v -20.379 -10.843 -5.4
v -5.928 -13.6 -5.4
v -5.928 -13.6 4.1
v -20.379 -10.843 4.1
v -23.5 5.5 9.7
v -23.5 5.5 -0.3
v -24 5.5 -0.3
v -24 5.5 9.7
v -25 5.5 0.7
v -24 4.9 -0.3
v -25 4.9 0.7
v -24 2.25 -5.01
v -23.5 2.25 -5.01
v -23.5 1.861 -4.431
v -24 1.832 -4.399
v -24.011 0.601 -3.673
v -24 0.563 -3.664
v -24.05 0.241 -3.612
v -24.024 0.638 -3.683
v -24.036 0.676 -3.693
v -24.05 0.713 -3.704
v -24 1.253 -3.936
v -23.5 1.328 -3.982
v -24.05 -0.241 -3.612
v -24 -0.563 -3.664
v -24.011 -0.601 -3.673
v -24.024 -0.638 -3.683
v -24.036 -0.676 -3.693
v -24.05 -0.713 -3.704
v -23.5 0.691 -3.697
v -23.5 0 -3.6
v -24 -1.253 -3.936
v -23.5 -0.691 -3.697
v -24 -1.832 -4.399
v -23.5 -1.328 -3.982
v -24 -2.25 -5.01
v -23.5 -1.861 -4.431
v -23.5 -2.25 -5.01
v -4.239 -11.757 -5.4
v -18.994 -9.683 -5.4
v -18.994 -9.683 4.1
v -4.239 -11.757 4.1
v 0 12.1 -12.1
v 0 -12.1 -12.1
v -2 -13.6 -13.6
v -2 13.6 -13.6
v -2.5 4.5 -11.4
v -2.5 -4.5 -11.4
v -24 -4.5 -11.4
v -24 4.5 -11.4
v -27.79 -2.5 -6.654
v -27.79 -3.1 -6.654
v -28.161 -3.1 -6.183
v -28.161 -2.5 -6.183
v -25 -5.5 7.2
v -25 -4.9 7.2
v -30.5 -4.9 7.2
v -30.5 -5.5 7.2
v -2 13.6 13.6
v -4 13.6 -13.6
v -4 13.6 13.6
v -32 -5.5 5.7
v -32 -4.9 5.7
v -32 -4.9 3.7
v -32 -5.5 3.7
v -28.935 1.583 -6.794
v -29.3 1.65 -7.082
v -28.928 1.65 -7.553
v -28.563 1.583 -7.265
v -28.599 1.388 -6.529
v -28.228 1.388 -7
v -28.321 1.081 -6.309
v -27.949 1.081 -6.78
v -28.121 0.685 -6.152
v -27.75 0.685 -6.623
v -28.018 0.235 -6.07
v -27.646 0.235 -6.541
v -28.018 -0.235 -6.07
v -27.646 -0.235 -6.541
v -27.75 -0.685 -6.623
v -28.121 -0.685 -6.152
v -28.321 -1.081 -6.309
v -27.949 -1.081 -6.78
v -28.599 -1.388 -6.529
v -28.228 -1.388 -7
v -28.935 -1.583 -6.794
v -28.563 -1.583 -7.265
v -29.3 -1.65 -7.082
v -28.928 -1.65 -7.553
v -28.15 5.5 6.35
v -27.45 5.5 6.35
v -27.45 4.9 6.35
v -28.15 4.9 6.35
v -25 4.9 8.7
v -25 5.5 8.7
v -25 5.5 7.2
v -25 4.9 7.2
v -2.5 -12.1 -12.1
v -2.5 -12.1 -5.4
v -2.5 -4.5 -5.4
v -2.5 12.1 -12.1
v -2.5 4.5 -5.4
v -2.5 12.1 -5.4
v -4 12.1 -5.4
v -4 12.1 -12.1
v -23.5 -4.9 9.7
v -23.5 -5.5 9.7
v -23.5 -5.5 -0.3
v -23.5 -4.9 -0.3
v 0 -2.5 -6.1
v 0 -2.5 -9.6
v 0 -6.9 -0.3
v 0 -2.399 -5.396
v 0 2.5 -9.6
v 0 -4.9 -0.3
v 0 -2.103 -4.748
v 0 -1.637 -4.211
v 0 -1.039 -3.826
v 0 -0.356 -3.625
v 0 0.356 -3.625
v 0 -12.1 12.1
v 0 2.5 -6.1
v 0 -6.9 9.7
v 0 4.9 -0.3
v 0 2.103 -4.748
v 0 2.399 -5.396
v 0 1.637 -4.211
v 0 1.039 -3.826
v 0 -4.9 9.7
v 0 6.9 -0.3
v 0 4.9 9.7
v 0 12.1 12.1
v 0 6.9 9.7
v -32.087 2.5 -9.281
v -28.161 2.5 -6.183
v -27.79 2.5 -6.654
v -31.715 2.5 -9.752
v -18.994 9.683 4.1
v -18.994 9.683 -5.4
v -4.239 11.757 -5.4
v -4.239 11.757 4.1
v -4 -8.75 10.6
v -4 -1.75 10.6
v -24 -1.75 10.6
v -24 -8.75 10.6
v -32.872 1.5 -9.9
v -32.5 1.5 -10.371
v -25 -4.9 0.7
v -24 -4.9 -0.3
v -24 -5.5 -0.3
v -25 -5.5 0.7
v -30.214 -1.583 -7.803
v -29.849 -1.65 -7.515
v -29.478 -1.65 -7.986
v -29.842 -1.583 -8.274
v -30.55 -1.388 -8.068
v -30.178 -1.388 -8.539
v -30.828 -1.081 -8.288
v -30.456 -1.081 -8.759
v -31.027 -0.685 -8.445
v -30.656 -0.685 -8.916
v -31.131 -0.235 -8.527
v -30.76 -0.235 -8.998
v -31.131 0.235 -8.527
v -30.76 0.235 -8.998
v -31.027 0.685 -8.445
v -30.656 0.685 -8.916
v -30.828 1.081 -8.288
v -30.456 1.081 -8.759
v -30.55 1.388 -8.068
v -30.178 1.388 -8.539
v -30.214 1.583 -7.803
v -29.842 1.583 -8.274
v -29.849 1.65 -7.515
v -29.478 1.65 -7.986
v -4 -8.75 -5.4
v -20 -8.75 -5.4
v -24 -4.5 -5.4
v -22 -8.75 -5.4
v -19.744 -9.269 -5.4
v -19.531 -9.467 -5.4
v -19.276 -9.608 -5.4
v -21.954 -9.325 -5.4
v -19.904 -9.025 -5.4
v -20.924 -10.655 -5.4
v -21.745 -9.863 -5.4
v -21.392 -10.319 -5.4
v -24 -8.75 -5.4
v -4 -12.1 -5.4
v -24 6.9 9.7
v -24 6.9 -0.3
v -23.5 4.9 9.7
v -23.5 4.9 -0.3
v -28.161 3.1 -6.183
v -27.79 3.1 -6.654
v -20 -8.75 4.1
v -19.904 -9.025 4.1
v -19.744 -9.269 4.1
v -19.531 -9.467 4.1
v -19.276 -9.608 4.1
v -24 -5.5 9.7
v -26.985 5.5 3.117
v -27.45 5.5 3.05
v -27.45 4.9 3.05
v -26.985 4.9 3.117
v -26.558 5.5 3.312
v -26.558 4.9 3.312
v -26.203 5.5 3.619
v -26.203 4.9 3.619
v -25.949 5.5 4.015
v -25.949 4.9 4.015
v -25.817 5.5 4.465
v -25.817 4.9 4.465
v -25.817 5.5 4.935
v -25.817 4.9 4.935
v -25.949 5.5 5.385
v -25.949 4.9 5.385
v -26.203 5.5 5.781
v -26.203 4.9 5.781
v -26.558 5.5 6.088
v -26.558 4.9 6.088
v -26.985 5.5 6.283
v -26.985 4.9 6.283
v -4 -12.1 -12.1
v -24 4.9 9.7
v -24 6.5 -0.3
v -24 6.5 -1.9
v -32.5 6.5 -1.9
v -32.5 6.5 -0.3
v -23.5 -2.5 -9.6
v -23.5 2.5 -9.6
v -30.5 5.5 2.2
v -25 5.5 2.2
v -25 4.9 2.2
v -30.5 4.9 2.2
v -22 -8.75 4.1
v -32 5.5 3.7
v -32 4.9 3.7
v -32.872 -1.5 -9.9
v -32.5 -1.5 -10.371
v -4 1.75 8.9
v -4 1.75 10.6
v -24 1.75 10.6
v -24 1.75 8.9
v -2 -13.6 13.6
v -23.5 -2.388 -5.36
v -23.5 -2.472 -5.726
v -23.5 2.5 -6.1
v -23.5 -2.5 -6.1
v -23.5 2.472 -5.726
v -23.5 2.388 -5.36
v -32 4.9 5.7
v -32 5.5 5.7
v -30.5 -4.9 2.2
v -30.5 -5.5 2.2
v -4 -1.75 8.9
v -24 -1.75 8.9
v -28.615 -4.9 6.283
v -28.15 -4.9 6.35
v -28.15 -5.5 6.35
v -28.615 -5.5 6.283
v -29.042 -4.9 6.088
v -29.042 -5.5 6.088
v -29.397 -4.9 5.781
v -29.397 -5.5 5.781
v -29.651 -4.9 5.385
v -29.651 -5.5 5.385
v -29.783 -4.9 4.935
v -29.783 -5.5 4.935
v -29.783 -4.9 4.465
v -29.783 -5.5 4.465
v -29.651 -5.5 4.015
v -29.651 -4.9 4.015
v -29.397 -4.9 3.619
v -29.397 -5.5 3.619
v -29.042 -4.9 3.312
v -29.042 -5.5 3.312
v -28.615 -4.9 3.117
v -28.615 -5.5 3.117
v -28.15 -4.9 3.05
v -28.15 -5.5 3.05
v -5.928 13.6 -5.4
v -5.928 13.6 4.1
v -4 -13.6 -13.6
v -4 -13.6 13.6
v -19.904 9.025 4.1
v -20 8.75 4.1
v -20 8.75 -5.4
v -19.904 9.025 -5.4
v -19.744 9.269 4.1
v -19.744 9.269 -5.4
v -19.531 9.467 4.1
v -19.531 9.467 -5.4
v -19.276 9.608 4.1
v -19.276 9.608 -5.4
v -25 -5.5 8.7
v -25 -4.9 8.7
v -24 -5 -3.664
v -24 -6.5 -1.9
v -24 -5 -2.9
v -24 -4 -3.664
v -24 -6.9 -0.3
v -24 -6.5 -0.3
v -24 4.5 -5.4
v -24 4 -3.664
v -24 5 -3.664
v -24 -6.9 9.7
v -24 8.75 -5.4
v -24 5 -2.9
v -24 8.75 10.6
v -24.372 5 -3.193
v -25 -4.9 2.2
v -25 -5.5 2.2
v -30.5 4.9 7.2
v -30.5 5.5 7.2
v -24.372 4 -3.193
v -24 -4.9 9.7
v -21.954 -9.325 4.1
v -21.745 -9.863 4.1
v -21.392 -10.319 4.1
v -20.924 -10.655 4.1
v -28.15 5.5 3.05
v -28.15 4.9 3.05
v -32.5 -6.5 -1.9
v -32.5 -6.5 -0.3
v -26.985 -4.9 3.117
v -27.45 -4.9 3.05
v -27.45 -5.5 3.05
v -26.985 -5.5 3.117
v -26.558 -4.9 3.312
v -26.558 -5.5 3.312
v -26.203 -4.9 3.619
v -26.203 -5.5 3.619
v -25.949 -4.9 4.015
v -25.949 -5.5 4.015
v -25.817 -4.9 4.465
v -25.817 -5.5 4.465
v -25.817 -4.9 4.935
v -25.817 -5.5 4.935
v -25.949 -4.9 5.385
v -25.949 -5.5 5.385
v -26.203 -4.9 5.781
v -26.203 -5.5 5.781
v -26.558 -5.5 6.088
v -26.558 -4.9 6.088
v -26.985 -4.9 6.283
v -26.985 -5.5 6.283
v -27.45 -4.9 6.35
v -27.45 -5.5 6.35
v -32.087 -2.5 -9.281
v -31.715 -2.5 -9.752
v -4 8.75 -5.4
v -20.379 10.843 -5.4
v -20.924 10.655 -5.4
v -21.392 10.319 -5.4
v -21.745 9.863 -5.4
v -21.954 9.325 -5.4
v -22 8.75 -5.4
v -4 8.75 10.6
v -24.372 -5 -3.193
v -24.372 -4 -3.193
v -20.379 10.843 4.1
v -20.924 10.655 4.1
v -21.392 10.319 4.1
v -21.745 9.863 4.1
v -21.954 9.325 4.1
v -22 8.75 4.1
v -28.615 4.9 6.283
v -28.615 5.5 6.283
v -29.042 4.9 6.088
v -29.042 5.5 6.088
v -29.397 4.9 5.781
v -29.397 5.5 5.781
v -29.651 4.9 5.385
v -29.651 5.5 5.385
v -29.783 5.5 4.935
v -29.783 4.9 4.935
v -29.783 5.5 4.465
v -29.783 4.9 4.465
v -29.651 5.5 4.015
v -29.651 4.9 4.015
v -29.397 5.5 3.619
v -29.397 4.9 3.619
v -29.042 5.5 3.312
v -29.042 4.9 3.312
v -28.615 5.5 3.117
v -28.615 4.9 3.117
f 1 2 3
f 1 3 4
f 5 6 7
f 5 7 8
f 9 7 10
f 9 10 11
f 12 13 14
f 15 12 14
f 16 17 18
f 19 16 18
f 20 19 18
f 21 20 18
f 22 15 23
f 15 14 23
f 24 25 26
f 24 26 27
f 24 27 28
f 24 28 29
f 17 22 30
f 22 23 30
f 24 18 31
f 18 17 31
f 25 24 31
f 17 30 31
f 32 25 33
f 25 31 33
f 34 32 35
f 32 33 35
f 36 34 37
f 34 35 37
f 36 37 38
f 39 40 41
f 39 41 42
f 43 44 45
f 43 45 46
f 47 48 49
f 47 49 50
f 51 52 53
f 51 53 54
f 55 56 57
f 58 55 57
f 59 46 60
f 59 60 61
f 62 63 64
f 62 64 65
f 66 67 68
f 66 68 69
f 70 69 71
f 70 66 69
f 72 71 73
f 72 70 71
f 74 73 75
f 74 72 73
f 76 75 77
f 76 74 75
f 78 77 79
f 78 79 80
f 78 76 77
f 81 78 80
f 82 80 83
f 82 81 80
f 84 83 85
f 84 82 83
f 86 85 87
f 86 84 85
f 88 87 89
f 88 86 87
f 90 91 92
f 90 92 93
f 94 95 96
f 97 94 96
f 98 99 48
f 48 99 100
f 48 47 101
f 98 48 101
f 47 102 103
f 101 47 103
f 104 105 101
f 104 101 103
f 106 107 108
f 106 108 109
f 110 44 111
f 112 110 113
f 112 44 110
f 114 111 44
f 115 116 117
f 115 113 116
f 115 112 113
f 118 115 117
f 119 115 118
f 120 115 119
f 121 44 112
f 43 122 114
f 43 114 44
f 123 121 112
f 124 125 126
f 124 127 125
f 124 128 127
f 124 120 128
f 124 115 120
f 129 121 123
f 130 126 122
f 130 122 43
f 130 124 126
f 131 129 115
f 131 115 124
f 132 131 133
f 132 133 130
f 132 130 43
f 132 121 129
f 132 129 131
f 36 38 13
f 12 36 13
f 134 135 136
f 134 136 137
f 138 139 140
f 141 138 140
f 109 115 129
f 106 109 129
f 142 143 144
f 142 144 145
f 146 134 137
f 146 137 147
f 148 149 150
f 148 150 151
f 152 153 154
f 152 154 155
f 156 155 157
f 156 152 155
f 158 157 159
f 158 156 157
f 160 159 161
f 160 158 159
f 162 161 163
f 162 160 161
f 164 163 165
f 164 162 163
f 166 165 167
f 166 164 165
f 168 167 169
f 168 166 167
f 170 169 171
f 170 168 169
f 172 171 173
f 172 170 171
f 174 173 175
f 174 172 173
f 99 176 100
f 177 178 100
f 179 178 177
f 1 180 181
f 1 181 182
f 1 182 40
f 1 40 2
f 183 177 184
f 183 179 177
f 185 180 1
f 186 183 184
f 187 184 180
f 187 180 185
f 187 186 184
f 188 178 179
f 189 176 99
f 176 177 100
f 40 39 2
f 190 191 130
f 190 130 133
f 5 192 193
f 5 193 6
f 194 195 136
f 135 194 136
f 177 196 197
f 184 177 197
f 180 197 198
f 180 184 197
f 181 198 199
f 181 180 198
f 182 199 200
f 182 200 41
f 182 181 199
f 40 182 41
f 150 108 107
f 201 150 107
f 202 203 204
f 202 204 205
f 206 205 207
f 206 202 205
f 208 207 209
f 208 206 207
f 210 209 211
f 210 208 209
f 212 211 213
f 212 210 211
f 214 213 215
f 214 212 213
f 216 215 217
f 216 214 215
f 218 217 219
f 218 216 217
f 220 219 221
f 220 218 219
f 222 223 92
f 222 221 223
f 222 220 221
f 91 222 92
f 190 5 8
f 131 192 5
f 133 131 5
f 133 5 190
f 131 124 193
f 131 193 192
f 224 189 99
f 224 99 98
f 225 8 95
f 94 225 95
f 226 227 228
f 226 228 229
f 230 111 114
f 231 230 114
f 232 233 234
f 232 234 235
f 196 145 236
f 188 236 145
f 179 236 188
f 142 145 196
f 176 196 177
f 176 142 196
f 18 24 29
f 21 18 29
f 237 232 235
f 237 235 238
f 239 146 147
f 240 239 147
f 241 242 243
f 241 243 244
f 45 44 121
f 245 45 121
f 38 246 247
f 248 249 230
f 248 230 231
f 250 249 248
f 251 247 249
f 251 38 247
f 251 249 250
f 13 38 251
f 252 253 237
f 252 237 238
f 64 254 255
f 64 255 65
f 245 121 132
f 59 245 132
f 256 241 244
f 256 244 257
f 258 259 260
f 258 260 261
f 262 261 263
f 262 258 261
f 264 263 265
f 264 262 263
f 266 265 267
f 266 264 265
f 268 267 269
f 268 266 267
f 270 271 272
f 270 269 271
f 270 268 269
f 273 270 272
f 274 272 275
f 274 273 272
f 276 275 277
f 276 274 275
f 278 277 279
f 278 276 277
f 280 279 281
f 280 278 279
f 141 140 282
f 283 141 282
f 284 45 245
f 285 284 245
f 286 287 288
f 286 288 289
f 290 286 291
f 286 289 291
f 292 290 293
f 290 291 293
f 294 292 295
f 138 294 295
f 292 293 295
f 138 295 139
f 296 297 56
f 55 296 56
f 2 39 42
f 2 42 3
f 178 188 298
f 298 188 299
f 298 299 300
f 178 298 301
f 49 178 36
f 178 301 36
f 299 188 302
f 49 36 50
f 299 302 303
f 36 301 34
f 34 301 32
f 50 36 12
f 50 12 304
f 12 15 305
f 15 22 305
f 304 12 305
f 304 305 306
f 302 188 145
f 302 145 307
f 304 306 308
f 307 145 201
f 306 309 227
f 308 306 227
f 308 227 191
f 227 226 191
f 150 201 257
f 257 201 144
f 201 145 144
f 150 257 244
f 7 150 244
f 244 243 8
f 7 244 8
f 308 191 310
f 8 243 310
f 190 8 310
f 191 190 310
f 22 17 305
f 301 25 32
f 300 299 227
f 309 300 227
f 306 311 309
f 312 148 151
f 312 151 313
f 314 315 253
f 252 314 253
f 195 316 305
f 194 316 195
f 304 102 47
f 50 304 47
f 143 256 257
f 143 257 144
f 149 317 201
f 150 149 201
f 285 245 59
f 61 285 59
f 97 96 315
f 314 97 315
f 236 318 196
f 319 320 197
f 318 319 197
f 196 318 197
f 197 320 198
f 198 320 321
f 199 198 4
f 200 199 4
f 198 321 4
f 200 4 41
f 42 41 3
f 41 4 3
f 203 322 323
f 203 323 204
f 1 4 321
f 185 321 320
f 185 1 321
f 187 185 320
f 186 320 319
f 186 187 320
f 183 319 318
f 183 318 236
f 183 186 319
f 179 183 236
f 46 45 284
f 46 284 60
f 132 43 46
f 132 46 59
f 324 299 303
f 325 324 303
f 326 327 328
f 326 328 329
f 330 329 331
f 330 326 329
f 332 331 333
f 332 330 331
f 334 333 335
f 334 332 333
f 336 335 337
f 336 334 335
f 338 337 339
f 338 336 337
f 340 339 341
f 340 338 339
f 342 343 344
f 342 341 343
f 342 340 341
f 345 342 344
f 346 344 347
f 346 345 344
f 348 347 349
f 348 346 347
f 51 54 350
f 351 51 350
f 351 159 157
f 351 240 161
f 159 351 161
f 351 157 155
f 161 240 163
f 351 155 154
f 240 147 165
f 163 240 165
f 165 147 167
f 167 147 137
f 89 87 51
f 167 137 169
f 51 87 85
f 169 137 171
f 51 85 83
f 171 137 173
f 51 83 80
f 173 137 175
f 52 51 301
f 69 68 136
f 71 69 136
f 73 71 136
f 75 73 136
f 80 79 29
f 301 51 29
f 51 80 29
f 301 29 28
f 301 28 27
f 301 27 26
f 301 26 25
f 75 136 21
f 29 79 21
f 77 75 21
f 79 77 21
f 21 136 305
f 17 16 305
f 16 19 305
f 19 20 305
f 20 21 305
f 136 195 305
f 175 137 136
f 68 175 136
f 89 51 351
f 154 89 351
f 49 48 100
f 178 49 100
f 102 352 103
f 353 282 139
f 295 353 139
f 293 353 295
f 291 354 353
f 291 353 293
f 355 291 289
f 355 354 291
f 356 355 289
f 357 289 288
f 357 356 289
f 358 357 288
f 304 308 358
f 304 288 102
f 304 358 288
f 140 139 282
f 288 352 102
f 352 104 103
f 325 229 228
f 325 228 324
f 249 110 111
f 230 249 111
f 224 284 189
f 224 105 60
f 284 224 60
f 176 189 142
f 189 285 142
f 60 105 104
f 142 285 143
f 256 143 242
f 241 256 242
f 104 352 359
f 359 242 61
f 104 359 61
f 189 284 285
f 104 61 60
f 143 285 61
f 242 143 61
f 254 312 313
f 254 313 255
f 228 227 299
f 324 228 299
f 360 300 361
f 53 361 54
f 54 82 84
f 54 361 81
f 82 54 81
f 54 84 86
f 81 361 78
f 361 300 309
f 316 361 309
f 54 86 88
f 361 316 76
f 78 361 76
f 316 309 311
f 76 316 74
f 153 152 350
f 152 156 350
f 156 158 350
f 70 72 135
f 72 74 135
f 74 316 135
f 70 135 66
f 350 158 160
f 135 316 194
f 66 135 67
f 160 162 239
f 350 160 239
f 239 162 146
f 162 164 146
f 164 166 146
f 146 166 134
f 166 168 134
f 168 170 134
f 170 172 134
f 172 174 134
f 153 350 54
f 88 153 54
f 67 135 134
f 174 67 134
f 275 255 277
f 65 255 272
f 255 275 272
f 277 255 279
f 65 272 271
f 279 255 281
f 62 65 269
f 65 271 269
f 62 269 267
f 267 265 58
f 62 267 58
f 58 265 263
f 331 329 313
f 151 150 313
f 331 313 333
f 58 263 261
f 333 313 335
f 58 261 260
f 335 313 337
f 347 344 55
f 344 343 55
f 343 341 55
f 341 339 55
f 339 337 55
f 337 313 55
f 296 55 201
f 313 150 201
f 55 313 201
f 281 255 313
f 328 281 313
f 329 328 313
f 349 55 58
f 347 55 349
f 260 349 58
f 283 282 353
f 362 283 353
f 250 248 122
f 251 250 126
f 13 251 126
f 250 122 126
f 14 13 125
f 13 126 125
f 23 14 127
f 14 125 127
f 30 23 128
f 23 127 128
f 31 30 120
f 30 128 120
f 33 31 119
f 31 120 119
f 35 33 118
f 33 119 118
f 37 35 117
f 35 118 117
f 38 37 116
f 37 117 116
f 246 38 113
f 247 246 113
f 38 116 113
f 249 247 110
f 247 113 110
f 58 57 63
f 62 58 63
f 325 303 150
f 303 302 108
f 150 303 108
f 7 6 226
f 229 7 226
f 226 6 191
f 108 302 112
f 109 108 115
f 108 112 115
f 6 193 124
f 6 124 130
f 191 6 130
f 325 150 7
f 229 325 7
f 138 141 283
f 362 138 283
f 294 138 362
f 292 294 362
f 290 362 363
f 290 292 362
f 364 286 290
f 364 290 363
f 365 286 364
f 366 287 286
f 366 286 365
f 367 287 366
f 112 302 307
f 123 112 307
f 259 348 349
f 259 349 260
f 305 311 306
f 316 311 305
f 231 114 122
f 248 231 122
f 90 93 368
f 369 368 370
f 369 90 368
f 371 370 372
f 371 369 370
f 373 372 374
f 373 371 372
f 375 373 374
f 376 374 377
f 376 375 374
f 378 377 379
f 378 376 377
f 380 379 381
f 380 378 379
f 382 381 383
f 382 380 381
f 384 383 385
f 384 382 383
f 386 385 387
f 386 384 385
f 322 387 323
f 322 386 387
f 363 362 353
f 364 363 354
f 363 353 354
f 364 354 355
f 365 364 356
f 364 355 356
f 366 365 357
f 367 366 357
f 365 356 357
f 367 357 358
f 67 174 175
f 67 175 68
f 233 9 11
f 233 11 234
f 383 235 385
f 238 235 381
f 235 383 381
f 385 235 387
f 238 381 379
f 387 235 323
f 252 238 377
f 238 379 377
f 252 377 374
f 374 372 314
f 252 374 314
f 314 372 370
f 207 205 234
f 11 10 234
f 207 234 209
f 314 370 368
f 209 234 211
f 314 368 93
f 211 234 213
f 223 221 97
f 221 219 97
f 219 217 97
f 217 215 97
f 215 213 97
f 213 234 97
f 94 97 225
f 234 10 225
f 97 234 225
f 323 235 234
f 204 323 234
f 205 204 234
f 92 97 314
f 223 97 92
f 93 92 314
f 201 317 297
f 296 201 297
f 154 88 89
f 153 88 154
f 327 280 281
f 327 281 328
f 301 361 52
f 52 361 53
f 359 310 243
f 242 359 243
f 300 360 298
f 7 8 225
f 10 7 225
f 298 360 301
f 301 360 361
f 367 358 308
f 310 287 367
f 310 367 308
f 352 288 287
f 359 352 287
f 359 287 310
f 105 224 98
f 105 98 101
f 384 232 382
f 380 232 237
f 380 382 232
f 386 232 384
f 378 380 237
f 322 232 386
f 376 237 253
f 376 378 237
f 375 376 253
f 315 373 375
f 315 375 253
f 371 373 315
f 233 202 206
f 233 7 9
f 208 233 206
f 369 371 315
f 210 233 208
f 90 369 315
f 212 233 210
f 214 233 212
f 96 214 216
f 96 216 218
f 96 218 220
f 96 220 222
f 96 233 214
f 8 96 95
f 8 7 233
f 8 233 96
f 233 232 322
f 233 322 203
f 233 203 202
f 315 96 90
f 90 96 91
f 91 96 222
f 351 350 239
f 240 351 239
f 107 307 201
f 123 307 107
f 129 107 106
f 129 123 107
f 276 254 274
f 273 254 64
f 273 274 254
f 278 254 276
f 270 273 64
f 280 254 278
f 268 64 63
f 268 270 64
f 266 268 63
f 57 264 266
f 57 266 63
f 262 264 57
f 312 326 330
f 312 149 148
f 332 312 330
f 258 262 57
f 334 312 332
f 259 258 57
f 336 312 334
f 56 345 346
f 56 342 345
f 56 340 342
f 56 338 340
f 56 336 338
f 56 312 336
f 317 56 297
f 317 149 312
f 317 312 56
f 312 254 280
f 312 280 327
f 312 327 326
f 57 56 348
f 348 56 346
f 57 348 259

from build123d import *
from OCP.BRepFilletAPI import BRepFilletAPI_MakeChamfer

# Parameters (mm, degrees)
CROQUIS1_W                = 27.2
CROQUIS1_H                = 27.2
SALIENTE_EXTRUIR1_DEPTH   = 4
CHAFL_N1_SIZE             = 2
CHAFL_N1_SIZE2            = 1.5
SALIENTE_EXTRUIR2_DEPTH   = 20
CORTAR_EXTRUIR1_DEPTH     = 1.5
SALIENTE_EXTRUIR3_DEPTH   = 9.5
CROQUIS6_W                = 13
CROQUIS6_H                = 1.6
SALIENTE_EXTRUIR4_DEPTH   = 8.5
CROQUIS7_W                = 0.6
CROQUIS7_H                = 10
SALIENTE_EXTRUIR5_DEPTH   = 8
SALIENTE_EXTRUIR5_2_DEPTH = 8
CORTAR_EXTRUIR2_DEPTH     = 41.075179351
SALIENTE_EXTRUIR6_DEPTH   = 5
CORTAR_EXTRUIR3_DEPTH     = 0.6
CROQUIS11_W               = 2
CROQUIS11_H               = 10
CORTAR_EXTRUIR4_DEPTH     = 23.5
CROQUIS12_W               = 1.4
CROQUIS12_H               = 10
CORTAR_EXTRUIR5_DEPTH     = 0.55


with BuildPart() as part:
    # Croquis1 → Saliente-Extruir1 (new body)
    with BuildSketch(Plane.YZ):
        Rectangle(CROQUIS1_W, CROQUIS1_H)
    extrude(amount=-SALIENTE_EXTRUIR1_DEPTH)

    # Chaflán1: one chamfer whose edges measure the first distance from different faces: ONE call of the kernel's chamfer builder (chamfer() names one face for all edges)
    chafl_n1_edges_1 = [part.edges().sort_by_distance(p)[0] for p in [
        (0, 0, -13.6),
    ]]
    chafl_n1_side_1 = [part.faces().sort_by_distance(p)[0] for p in [
        (-2, 0, -13.6),
    ]]
    chafl_n1_edges_2 = [part.edges().sort_by_distance(p)[0] for p in [
        (0, -13.6, 0),
    ]]
    chafl_n1_side_2 = [part.faces().sort_by_distance(p)[0] for p in [
        (-2, -13.6, 0),
    ]]
    chafl_n1_edges_3 = [part.edges().sort_by_distance(p)[0] for p in [
        (0, 0, 13.6),
    ]]
    chafl_n1_side_3 = [part.faces().sort_by_distance(p)[0] for p in [
        (-2, 0, 13.6),
    ]]
    chafl_n1_edges_4 = [part.edges().sort_by_distance(p)[0] for p in [
        (0, 13.6, 0),
    ]]
    chafl_n1_side_4 = [part.faces().sort_by_distance(p)[0] for p in [
        (-2, 13.6, 0),
    ]]
    chafl_n1 = BRepFilletAPI_MakeChamfer(part.part.solid().wrapped)
    for e in chafl_n1_edges_1:
        chafl_n1.Add(CHAFL_N1_SIZE, CHAFL_N1_SIZE2, e.wrapped, chafl_n1_side_1[0].wrapped)  # the first distance lies on this face
    for e in chafl_n1_edges_2:
        chafl_n1.Add(CHAFL_N1_SIZE, CHAFL_N1_SIZE2, e.wrapped, chafl_n1_side_2[0].wrapped)  # the first distance lies on this face
    for e in chafl_n1_edges_3:
        chafl_n1.Add(CHAFL_N1_SIZE, CHAFL_N1_SIZE2, e.wrapped, chafl_n1_side_3[0].wrapped)  # the first distance lies on this face
    for e in chafl_n1_edges_4:
        chafl_n1.Add(CHAFL_N1_SIZE, CHAFL_N1_SIZE2, e.wrapped, chafl_n1_side_4[0].wrapped)  # the first distance lies on this face
    add(Compound.cast(chafl_n1.Shape()), mode=Mode.REPLACE)

    # Croquis3 → Saliente-Extruir2 (add)
    with BuildSketch(Plane(origin=(-4, 0, 0), x_dir=(0, -1, 0), z_dir=(-1, 0, 0))):
        Polygon((1.75, 10.6), (8.75, 10.6), (8.75, -5.4), (4.5, -5.4), (4.5, -11.4), (-4.5, -11.4), (-4.5, -5.4), (-8.75, -5.4), (-8.75, 10.6), (-1.75, 10.6), (-1.75, 8.9), (1.75, 8.9), align=None)
    extrude(amount=SALIENTE_EXTRUIR2_DEPTH)

    # Croquis4 → Cortar-Extruir1 (cut)
    with BuildSketch(Plane(origin=(-4, 0, 0), x_dir=(0, -1, 0), z_dir=(-1, 0, 0))):
        Polygon((-12.1, -5.4), (-4.5, -5.4), (-4.5, -11.4), (4.5, -11.4), (4.5, -5.4), (12.1, -5.4), (12.1, -12.1), (-12.1, -12.1), align=None)
    extrude(amount=-CORTAR_EXTRUIR1_DEPTH, mode=Mode.SUBTRACT)

    # Croquis5 → Saliente-Extruir3 (add)
    with BuildSketch(Plane(origin=(0, 0, -5.4), x_dir=(1, 0, 0), z_dir=(0, 0, -1))):
        with BuildLine():
            Line((-18.994456696, 9.683127454), (-4.239462472, 11.756806658))
            Line((-4.239462472, 11.756806658), (-5.928437991, 13.6))
            Line((-5.928437991, 13.6), (-20.378917468, 10.843423613))
            ThreePointArc((-20.378917468, 10.843423613), (-21.585467879, 10.103369046), (-22, 8.75))
            Line((-22, 8.75), (-20, 8.75))
            ThreePointArc((-20, 8.75), (-19.643712486, 9.374415844), (-18.994456696, 9.683127454))
        make_face()
        with BuildLine():
            Line((-5.928437991, -13.6), (-20.378917468, -10.843423613))
            ThreePointArc((-20.378917468, -10.843423613), (-21.585467879, -10.103369046), (-22, -8.75))
            Line((-22, -8.75), (-20, -8.75))
            ThreePointArc((-20, -8.75), (-19.643712486, -9.374415844), (-18.994456696, -9.683127454))
            Line((-18.994456696, -9.683127454), (-4.239462472, -11.756806658))
            Line((-4.239462472, -11.756806658), (-5.928437991, -13.6))
        make_face()
    extrude(amount=-SALIENTE_EXTRUIR3_DEPTH)

    # Croquis6 → Saliente-Extruir4 (add)
    with BuildSketch(Plane(origin=(-24, 0, 0), x_dir=(0, -1, 0), z_dir=(-1, 0, 0))):
        with Locations((0, -1.1)):
            Rectangle(CROQUIS6_W, CROQUIS6_H)
    extrude(amount=SALIENTE_EXTRUIR4_DEPTH)

    # Croquis9 → Saliente-Extruir6 (add, symmetric)
    with BuildSketch(Plane(origin=(0, 0, 0), x_dir=(-1, 0, 0), z_dir=(0, 1, 0))):
        Polygon((24, -2.9), (32.871657681, -9.9), (32.5, -10.371031388), (23.628342319, -3.371031388), align=None)
    extrude(amount=SALIENTE_EXTRUIR6_DEPTH, both=True)

    # Croquis10 → Cortar-Extruir3 (cut)
    with BuildSketch(Plane(origin=(-7.798403611, 0, 9.883538185), x_dir=(0.7850523133577078, 0, 0.6194294675681095), z_dir=(-0.6194294675681093, 0, 0.7850523133577076))):
        Polygon((-31.938322635, -1.5), (-31.938322635, -5), (-21.111018702, -5), (-21.111018702, -4), (-25.938322635, -3.1), (-25.938322635, -2.5), (-30.938322635, -2.5), align=None)
        Polygon((-30.938322635, 2.5), (-31.938322635, 1.5), (-31.938322635, 5), (-21.111018702, 5), (-21.111018702, 4), (-25.938322635, 3.1), (-25.938322635, 2.5), align=None)
        with BuildLine():
            Line((-28.088322635, 1.65), (-27.388322635, 1.65))
            ThreePointArc((-27.388322635, 1.65), (-25.738322635, 0), (-27.388322635, -1.65))
            Line((-27.388322635, -1.65), (-28.088322635, -1.65))
            ThreePointArc((-28.088322635, -1.65), (-29.738322635, 0), (-28.088322635, 1.65))
        make_face()
    extrude(amount=-CORTAR_EXTRUIR3_DEPTH, mode=Mode.SUBTRACT)

    # Croquis11 → Cortar-Extruir4 (cut)
    with BuildSketch(Plane.YZ):
        with Locations((-5.9, 4.7)):
            Rectangle(CROQUIS11_W, CROQUIS11_H)
        with Locations((5.9, 4.7)):
            Rectangle(CROQUIS11_W, CROQUIS11_H)
        with BuildLine():
            Line((-2.5, -9.6), (2.5, -9.6))
            Line((2.5, -9.6), (2.5, -6.1))
            ThreePointArc((2.5, -6.1), (0, -3.6), (-2.5, -6.1))
            Line((-2.5, -6.1), (-2.5, -9.6))
        make_face()
    extrude(amount=-CORTAR_EXTRUIR4_DEPTH, mode=Mode.SUBTRACT)

    # Croquis12 → Cortar-Extruir5 (cut)
    with BuildSketch(Plane.YZ.offset(-23.5)):
        with Locations((-6.2, 4.7)):
            Rectangle(CROQUIS12_W, CROQUIS12_H)
        with Locations((6.2, 4.7)):
            Rectangle(CROQUIS12_W, CROQUIS12_H)
        with BuildLine():
            Line((-2.25, -5.010275264), (2.25, -5.010275264))
            ThreePointArc((2.25, -5.010275264), (0, -3.6), (-2.25, -5.010275264))
        make_face()
    extrude(amount=-CORTAR_EXTRUIR5_DEPTH, mode=Mode.SUBTRACT)


with BuildPart() as body_2:
    # Croquis7 → Saliente-Extruir5 (new body)
    with BuildSketch(Plane(origin=(-24, 0, 0), x_dir=(0, -1, 0), z_dir=(-1, 0, 0))):
        with Locations((-5.2, 4.7)):
            Rectangle(CROQUIS7_W, CROQUIS7_H)
    extrude(amount=SALIENTE_EXTRUIR5_DEPTH)


with BuildPart() as body_3:
    # Croquis7 → Saliente-Extruir5 2 (new body)
    with BuildSketch(Plane(origin=(-24, 0, 0), x_dir=(0, -1, 0), z_dir=(-1, 0, 0))):
        with Locations((5.2, 4.7)):
            Rectangle(CROQUIS7_W, CROQUIS7_H)
    extrude(amount=SALIENTE_EXTRUIR5_2_DEPTH)


with BuildPart() as cortar_extruir2_tool:
    # Croquis8 → Cortar-Extruir2 (new, through all)
    with BuildSketch(Plane(origin=(0, 5.5, 0), x_dir=(-1, 0, 0), z_dir=(0, 1, 0))):
        Polygon((24, -0.3), (25, 0.7), (25, 2.2), (30.5, 2.2), (32, 3.7), (32, -0.3), align=None)
        Polygon((32, 5.7), (32, 9.7), (24, 9.7), (25, 8.7), (25, 7.2), (30.5, 7.2), align=None)
        with BuildLine():
            Line((27.45, 6.35), (28.15, 6.35))
            ThreePointArc((28.15, 6.35), (29.8, 4.7), (28.15, 3.05))
            Line((28.15, 3.05), (27.45, 3.05))
            ThreePointArc((27.45, 3.05), (25.8, 4.7), (27.45, 6.35))
        make_face()
    extrude(amount=-CORTAR_EXTRUIR2_DEPTH)


with BuildPart() as body_2_1:
    add(body_2.part)

    # Cortar-Extruir2: cut by cortar_extruir2_tool
    add(cortar_extruir2_tool.part, mode=Mode.SUBTRACT)


with BuildPart() as body_3_1:
    add(body_3.part)

    # Cortar-Extruir2: cut by cortar_extruir2_tool
    add(cortar_extruir2_tool.part, mode=Mode.SUBTRACT)


solid = Compound([part.part, body_2_1.part, body_3_1.part])
